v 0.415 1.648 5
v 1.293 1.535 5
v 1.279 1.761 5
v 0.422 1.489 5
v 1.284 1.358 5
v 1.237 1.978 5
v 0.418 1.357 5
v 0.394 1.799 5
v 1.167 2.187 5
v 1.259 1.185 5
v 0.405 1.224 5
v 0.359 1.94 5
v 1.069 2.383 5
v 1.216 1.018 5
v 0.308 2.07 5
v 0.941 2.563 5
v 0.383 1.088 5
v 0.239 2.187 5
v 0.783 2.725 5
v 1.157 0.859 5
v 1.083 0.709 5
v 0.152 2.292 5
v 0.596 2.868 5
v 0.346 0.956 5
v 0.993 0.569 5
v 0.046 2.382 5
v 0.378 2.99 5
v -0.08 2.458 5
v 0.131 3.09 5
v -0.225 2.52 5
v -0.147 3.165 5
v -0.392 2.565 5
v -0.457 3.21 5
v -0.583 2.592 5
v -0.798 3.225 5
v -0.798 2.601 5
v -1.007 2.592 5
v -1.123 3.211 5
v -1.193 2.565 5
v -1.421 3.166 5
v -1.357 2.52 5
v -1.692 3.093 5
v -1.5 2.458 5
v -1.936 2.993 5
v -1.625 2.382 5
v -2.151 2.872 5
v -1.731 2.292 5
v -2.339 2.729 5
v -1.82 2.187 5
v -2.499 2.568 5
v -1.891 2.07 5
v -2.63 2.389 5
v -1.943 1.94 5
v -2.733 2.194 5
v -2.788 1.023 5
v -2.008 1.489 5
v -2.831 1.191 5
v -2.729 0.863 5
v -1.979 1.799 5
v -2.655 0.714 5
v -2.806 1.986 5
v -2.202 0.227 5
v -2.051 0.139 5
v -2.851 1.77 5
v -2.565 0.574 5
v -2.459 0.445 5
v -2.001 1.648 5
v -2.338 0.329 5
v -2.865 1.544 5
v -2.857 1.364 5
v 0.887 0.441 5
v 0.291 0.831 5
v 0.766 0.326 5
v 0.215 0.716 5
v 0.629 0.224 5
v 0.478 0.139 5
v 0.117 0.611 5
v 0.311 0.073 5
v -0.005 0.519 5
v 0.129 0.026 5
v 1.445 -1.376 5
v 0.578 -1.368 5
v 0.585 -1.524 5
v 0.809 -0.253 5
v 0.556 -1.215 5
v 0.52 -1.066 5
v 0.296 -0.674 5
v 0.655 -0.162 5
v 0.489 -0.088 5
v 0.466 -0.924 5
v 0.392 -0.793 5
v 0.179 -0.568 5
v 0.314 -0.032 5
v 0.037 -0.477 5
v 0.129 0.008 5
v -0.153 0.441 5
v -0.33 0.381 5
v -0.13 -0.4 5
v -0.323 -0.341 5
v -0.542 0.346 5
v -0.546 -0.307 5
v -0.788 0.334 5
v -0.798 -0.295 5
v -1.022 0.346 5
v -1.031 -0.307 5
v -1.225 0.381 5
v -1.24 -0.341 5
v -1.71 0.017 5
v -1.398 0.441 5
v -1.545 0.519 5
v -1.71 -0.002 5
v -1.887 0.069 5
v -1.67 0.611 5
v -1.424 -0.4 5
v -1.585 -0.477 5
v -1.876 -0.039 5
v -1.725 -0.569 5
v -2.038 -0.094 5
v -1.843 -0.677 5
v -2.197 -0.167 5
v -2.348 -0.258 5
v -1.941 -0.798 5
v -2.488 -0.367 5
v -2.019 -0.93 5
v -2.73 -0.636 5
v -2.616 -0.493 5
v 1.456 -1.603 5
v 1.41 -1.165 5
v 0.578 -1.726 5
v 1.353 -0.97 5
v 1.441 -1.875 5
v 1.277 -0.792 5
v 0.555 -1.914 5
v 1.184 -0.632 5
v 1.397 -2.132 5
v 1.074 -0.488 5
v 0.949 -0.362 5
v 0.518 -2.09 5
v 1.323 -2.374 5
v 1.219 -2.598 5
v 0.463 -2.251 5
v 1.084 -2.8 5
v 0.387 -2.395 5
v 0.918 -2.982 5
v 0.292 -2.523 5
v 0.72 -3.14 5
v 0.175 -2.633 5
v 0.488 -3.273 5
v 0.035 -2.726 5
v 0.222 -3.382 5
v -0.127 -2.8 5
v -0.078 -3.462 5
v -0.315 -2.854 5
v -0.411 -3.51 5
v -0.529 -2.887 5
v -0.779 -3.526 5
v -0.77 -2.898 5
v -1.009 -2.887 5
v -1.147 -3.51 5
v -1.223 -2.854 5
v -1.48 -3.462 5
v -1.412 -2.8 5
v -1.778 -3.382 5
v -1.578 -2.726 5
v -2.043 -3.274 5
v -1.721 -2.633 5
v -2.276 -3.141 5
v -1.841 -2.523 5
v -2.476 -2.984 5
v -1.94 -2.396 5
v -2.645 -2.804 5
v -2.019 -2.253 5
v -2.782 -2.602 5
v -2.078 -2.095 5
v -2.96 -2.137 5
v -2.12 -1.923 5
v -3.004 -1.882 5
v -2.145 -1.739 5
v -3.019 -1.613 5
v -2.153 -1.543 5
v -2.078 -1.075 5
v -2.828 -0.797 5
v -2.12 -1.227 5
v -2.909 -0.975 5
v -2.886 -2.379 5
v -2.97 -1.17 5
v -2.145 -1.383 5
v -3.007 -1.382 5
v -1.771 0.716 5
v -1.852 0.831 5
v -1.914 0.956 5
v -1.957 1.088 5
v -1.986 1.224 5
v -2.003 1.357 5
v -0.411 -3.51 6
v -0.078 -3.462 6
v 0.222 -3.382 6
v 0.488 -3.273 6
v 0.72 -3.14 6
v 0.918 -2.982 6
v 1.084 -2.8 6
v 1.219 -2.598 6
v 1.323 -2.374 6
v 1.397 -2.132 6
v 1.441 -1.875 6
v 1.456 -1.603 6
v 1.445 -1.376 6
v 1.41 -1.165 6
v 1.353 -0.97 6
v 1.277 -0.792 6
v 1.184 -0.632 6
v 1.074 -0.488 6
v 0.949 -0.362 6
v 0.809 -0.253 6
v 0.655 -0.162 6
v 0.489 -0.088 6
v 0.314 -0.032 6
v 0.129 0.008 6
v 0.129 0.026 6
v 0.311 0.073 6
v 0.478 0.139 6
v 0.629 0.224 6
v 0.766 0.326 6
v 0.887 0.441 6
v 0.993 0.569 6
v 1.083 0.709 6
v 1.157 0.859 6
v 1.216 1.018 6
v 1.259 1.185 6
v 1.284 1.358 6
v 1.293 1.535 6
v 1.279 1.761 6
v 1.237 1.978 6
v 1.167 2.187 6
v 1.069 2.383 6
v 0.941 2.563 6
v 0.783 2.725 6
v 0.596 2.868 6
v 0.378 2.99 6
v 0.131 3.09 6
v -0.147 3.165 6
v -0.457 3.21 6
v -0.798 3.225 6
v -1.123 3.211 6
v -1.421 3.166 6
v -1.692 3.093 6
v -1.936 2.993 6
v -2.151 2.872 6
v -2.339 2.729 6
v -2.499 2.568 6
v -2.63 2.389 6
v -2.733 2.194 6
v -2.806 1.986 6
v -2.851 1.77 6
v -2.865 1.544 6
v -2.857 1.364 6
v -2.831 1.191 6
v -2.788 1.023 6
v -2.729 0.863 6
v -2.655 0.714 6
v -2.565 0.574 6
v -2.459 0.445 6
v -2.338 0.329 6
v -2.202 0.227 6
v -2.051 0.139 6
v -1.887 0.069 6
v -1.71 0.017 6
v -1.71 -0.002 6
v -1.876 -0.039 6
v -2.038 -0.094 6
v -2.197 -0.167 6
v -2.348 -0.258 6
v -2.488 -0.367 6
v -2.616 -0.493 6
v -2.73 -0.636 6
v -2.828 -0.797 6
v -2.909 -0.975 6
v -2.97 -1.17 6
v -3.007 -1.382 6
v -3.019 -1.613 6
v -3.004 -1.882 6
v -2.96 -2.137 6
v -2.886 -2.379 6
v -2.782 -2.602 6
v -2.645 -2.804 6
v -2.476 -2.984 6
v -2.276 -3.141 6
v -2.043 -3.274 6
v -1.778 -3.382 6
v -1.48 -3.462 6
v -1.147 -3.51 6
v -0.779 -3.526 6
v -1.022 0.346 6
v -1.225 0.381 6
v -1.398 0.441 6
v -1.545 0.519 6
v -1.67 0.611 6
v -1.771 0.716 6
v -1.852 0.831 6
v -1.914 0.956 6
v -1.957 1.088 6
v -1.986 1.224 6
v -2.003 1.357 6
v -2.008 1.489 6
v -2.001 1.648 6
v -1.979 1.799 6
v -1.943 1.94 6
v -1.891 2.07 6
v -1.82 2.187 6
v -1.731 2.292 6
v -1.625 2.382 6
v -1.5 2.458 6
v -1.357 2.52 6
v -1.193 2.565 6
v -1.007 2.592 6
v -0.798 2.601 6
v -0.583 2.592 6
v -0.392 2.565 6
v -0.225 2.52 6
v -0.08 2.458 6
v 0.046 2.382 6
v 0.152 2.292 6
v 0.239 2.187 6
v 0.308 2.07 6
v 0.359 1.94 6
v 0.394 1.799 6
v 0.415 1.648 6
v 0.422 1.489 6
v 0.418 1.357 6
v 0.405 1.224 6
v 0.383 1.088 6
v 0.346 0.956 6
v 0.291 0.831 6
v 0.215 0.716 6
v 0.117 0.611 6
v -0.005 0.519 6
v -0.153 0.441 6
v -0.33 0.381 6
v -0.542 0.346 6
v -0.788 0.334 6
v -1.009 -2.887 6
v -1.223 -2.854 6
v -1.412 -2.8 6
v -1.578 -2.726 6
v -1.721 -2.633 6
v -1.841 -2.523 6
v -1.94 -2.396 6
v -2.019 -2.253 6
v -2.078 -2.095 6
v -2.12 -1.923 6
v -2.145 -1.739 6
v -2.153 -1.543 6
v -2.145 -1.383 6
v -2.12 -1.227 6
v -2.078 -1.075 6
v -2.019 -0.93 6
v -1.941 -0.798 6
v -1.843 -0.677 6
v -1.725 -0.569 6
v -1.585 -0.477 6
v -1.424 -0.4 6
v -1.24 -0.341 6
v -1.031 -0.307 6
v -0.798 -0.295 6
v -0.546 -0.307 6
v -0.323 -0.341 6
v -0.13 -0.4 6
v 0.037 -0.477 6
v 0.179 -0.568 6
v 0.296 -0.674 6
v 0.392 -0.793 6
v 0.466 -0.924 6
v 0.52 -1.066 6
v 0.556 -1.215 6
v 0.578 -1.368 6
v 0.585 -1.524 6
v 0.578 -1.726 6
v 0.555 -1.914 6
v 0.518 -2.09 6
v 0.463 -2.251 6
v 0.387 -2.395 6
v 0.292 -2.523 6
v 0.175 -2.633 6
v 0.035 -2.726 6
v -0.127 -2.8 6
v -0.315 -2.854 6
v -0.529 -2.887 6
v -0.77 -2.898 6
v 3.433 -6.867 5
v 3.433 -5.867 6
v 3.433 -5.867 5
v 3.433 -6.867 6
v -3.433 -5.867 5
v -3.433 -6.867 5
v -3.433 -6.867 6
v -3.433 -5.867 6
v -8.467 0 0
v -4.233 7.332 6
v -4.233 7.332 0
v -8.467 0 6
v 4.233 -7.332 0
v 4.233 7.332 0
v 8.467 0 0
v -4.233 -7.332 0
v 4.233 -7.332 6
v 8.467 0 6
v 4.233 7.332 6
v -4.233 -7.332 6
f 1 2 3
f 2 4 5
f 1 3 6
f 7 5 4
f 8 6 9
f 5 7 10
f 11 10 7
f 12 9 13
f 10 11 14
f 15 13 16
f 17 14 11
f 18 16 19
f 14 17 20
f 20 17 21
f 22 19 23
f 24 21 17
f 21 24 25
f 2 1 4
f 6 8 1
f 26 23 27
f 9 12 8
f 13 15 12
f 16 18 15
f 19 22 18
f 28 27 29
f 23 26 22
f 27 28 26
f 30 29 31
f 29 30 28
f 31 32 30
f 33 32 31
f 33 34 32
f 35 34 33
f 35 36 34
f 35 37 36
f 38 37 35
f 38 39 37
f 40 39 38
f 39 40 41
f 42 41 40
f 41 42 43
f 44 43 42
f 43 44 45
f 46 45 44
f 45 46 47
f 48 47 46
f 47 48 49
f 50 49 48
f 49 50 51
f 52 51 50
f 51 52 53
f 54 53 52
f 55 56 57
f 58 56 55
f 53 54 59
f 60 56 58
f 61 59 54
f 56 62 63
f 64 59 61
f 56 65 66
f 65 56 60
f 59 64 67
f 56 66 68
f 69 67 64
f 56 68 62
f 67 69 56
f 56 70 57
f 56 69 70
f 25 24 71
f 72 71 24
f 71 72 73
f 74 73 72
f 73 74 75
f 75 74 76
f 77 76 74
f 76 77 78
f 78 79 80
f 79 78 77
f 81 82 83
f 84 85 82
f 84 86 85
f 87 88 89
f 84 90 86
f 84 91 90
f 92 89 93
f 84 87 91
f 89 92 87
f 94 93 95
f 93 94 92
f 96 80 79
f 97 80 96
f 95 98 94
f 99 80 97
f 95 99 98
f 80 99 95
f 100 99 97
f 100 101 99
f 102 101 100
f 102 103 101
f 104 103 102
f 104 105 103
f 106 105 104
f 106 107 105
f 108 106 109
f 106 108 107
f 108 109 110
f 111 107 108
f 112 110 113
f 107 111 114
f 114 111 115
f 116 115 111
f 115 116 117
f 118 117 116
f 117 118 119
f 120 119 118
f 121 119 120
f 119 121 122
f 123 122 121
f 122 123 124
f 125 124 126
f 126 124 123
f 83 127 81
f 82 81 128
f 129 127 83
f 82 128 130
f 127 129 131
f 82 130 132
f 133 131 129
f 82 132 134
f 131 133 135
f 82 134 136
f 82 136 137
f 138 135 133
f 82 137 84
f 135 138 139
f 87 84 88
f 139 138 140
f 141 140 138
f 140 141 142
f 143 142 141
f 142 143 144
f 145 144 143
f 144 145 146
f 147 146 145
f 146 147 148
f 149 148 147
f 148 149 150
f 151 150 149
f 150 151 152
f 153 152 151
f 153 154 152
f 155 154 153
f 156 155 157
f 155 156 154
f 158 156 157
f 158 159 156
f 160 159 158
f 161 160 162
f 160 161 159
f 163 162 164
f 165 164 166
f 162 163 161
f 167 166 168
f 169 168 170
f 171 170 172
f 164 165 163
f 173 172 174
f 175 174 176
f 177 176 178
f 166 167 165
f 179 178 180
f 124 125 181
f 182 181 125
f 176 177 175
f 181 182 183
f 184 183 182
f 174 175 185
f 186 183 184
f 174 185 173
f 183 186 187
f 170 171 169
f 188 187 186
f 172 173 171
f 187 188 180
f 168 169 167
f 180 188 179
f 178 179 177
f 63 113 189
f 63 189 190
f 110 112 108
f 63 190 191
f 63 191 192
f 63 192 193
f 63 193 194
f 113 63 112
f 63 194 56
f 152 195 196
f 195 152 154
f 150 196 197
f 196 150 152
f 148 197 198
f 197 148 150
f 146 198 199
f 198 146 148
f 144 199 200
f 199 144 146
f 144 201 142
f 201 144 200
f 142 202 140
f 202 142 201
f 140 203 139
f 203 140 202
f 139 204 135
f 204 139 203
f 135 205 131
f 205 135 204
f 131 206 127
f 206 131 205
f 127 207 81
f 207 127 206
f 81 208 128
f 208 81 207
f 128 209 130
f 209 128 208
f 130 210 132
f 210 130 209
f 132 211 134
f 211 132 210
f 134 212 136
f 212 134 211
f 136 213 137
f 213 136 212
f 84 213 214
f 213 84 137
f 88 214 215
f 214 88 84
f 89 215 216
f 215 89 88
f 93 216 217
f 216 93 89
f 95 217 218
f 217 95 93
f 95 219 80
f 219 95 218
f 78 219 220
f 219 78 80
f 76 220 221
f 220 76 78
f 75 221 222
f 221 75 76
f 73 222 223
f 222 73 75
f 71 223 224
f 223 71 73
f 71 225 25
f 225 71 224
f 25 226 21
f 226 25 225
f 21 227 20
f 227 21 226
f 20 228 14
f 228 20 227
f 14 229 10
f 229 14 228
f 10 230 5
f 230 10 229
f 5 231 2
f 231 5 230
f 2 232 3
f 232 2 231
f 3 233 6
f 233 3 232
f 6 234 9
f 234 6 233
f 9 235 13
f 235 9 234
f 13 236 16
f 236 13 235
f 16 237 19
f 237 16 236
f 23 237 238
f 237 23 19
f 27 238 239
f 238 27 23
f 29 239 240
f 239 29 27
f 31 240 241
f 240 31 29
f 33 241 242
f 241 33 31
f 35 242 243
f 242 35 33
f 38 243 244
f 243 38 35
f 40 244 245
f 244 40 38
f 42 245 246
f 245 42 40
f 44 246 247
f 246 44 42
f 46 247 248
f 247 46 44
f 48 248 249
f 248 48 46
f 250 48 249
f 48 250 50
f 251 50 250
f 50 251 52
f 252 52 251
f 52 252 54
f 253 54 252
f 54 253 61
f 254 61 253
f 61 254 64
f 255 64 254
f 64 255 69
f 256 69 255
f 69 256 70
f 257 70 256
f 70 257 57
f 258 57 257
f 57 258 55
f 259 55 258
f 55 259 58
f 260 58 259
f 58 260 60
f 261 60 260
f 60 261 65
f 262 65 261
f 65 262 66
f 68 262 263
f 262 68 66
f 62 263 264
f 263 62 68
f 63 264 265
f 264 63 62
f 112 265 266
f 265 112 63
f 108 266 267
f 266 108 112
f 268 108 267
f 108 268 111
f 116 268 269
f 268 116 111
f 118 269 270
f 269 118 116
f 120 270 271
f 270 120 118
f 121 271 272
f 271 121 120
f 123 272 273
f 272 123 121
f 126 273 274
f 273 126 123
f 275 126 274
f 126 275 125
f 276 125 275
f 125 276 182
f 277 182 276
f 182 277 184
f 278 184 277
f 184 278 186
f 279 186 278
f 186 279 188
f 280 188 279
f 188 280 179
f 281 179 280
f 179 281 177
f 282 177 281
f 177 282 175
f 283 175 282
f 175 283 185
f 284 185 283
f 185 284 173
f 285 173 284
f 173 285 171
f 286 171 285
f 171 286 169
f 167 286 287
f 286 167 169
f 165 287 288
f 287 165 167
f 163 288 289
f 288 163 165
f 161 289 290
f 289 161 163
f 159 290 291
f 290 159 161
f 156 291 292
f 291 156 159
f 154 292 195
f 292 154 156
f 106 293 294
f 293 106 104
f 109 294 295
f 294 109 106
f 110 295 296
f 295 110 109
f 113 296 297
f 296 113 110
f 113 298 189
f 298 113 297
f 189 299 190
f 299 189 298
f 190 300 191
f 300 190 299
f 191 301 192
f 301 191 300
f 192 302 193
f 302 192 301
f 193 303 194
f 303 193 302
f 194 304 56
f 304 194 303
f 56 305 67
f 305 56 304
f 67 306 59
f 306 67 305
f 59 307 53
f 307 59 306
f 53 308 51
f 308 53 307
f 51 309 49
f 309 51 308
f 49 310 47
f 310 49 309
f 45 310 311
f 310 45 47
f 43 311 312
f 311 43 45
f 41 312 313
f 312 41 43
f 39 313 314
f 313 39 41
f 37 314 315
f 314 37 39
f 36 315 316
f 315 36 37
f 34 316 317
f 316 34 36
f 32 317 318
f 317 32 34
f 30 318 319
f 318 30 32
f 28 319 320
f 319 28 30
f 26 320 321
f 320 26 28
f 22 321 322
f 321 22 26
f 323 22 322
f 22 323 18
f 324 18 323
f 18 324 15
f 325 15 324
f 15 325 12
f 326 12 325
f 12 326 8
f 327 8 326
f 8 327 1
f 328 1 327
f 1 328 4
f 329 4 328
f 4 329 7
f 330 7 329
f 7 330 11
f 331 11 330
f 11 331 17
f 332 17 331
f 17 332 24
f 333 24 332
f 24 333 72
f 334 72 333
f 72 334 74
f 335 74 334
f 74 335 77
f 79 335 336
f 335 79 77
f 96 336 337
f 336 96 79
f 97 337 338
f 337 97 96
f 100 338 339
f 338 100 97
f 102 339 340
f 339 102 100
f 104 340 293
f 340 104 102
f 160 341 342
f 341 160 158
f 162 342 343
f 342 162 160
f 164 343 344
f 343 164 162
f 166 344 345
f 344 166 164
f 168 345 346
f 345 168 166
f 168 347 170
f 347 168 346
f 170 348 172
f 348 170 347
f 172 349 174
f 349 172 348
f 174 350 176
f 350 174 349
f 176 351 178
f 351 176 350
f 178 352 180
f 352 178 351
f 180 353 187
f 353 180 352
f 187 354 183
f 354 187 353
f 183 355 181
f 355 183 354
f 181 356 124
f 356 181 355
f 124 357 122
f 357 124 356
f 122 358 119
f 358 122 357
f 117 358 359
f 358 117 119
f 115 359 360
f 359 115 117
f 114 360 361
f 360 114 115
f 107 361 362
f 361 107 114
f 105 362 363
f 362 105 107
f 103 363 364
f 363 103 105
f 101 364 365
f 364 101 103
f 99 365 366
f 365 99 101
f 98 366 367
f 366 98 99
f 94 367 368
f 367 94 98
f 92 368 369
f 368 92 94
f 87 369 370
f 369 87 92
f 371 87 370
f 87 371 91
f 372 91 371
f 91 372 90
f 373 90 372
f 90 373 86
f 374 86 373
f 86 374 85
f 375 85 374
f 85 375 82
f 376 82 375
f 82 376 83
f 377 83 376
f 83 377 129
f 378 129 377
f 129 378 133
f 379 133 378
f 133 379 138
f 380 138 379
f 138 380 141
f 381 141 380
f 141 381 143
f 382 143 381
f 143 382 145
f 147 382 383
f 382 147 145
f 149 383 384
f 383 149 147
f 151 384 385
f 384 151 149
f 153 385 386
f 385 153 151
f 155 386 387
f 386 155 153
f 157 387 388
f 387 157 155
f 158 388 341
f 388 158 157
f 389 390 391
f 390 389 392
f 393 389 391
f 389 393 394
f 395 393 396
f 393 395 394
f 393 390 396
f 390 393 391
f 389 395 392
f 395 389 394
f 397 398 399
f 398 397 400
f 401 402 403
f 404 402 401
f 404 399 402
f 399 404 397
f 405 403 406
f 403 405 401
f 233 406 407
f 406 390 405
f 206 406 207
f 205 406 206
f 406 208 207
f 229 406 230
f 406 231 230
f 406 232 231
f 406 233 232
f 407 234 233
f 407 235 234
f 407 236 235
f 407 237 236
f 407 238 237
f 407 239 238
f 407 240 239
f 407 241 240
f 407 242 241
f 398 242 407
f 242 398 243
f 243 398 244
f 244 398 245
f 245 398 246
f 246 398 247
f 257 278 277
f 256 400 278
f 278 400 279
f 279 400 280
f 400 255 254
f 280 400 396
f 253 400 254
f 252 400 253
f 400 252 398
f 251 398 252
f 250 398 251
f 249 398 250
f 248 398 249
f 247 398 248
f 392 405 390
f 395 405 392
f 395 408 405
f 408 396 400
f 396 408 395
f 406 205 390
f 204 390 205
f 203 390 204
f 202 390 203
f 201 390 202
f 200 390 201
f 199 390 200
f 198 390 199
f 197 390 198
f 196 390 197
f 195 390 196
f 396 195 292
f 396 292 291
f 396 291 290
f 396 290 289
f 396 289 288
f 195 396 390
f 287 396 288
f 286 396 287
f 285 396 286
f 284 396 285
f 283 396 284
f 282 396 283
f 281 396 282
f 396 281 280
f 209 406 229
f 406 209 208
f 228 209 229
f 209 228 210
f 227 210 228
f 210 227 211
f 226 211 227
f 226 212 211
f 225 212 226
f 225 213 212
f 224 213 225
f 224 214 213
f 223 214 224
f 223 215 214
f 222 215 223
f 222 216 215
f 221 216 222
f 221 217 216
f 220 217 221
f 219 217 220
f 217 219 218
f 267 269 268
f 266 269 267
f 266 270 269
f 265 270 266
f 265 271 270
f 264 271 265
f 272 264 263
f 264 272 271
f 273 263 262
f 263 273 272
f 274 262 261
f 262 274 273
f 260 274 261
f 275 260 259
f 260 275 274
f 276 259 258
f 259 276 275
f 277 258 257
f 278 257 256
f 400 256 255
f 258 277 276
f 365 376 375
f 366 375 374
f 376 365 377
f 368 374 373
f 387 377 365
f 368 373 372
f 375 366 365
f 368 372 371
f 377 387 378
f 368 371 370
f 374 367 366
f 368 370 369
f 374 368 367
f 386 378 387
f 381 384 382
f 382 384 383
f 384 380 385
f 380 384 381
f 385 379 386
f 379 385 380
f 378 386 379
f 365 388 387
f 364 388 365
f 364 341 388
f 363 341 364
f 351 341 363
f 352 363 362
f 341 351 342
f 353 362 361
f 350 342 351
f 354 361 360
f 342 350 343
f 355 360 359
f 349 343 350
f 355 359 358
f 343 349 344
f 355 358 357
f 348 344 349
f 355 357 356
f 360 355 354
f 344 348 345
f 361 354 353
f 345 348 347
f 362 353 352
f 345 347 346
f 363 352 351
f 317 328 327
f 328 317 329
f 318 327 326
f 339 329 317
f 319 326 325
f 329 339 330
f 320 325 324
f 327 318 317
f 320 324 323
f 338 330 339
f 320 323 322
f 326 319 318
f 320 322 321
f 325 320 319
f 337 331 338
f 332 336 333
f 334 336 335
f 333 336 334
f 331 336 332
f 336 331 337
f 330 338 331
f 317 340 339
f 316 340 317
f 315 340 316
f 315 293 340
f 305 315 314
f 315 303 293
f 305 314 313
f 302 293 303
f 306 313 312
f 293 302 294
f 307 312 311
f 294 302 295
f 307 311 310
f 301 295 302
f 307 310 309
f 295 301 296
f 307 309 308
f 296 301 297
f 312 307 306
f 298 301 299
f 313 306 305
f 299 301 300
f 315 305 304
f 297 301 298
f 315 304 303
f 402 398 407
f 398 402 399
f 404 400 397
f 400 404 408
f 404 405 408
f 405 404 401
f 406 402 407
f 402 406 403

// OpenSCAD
// file: ../library/calculate.scad
module inlay(depth)
{
    difference()
    {
        children(0);
        translate([ 0, 0, depth ]) children([1:$children - 1]);
    }
}
// file: ../library/variables.scad
// Variables

die_width = 12;
double_digit_placement = 1; // 0.7 for 8mm, 1 for 12mm

wiggle_width = 0.2;
separator = 1.6;
base_plate_sides = 5;
token_sides = 6;
slot_height = 1;

// Calculations

height = die_width / 2;

die_slot_width = die_width + wiggle_width;
die_slot_y = -1 * ((die_slot_width / 2) + separator);
die_slot_right_x = (die_slot_width / 2) + separator;
die_slot_left_x = -1 * (die_slot_width / 2) - separator;

base_plate_size = (die_slot_width * 2) + separator;
inset_width = base_plate_size - separator;
inset_depth = height - separator;

shallow_slot_height = (height - inset_depth) / 2;

token_slot_width = base_plate_size / 3;
token_width = token_slot_width - wiggle_width;
token_height = height;
token_slot_y = (die_slot_width / 2) + (separator * 2);
token_inset_height = token_height - 1;
token_doubledigit_font_size = token_width - separator;

token_poison_width = (token_width / 3);
token_poison_placement = (token_width / 3);
// file: ../library/tokens.scad
include <variables.scad>
include <calculate.scad>

module token_base()
{
    linear_extrude(token_height) circle(token_width, $fn = token_sides);
}

module token_doubledigit_number(num) 
{
    inlay(depth = token_inset_height) 
    {
        token_base();
        translate([-1 * token_doubledigit_font_size + double_digit_placement, -1 * token_doubledigit_font_size / 2, 0]) linear_extrude(token_height) text(text = num, size = token_doubledigit_font_size);
        translate([-1 * token_doubledigit_font_size / 2, -1 * token_doubledigit_font_size, 0]) cube([token_doubledigit_font_size, 1, 2]);
    }
}

module token_singledigit_number(num) 
{ 
    inlay(depth = token_inset_height) 
    {
        token_base();
        translate([-1 * (token_doubledigit_font_size / 2), -1 * token_doubledigit_font_size / 2, 0]) linear_extrude(token_height) text(text = num, size = token_doubledigit_font_size);
        translate([-1 * token_doubledigit_font_size / 2, -1 * token_doubledigit_font_size, 0]) cube([token_doubledigit_font_size, 1, 2]);
    }
}
// main file
include <../library/tokens.scad>

token_singledigit_number("8");
